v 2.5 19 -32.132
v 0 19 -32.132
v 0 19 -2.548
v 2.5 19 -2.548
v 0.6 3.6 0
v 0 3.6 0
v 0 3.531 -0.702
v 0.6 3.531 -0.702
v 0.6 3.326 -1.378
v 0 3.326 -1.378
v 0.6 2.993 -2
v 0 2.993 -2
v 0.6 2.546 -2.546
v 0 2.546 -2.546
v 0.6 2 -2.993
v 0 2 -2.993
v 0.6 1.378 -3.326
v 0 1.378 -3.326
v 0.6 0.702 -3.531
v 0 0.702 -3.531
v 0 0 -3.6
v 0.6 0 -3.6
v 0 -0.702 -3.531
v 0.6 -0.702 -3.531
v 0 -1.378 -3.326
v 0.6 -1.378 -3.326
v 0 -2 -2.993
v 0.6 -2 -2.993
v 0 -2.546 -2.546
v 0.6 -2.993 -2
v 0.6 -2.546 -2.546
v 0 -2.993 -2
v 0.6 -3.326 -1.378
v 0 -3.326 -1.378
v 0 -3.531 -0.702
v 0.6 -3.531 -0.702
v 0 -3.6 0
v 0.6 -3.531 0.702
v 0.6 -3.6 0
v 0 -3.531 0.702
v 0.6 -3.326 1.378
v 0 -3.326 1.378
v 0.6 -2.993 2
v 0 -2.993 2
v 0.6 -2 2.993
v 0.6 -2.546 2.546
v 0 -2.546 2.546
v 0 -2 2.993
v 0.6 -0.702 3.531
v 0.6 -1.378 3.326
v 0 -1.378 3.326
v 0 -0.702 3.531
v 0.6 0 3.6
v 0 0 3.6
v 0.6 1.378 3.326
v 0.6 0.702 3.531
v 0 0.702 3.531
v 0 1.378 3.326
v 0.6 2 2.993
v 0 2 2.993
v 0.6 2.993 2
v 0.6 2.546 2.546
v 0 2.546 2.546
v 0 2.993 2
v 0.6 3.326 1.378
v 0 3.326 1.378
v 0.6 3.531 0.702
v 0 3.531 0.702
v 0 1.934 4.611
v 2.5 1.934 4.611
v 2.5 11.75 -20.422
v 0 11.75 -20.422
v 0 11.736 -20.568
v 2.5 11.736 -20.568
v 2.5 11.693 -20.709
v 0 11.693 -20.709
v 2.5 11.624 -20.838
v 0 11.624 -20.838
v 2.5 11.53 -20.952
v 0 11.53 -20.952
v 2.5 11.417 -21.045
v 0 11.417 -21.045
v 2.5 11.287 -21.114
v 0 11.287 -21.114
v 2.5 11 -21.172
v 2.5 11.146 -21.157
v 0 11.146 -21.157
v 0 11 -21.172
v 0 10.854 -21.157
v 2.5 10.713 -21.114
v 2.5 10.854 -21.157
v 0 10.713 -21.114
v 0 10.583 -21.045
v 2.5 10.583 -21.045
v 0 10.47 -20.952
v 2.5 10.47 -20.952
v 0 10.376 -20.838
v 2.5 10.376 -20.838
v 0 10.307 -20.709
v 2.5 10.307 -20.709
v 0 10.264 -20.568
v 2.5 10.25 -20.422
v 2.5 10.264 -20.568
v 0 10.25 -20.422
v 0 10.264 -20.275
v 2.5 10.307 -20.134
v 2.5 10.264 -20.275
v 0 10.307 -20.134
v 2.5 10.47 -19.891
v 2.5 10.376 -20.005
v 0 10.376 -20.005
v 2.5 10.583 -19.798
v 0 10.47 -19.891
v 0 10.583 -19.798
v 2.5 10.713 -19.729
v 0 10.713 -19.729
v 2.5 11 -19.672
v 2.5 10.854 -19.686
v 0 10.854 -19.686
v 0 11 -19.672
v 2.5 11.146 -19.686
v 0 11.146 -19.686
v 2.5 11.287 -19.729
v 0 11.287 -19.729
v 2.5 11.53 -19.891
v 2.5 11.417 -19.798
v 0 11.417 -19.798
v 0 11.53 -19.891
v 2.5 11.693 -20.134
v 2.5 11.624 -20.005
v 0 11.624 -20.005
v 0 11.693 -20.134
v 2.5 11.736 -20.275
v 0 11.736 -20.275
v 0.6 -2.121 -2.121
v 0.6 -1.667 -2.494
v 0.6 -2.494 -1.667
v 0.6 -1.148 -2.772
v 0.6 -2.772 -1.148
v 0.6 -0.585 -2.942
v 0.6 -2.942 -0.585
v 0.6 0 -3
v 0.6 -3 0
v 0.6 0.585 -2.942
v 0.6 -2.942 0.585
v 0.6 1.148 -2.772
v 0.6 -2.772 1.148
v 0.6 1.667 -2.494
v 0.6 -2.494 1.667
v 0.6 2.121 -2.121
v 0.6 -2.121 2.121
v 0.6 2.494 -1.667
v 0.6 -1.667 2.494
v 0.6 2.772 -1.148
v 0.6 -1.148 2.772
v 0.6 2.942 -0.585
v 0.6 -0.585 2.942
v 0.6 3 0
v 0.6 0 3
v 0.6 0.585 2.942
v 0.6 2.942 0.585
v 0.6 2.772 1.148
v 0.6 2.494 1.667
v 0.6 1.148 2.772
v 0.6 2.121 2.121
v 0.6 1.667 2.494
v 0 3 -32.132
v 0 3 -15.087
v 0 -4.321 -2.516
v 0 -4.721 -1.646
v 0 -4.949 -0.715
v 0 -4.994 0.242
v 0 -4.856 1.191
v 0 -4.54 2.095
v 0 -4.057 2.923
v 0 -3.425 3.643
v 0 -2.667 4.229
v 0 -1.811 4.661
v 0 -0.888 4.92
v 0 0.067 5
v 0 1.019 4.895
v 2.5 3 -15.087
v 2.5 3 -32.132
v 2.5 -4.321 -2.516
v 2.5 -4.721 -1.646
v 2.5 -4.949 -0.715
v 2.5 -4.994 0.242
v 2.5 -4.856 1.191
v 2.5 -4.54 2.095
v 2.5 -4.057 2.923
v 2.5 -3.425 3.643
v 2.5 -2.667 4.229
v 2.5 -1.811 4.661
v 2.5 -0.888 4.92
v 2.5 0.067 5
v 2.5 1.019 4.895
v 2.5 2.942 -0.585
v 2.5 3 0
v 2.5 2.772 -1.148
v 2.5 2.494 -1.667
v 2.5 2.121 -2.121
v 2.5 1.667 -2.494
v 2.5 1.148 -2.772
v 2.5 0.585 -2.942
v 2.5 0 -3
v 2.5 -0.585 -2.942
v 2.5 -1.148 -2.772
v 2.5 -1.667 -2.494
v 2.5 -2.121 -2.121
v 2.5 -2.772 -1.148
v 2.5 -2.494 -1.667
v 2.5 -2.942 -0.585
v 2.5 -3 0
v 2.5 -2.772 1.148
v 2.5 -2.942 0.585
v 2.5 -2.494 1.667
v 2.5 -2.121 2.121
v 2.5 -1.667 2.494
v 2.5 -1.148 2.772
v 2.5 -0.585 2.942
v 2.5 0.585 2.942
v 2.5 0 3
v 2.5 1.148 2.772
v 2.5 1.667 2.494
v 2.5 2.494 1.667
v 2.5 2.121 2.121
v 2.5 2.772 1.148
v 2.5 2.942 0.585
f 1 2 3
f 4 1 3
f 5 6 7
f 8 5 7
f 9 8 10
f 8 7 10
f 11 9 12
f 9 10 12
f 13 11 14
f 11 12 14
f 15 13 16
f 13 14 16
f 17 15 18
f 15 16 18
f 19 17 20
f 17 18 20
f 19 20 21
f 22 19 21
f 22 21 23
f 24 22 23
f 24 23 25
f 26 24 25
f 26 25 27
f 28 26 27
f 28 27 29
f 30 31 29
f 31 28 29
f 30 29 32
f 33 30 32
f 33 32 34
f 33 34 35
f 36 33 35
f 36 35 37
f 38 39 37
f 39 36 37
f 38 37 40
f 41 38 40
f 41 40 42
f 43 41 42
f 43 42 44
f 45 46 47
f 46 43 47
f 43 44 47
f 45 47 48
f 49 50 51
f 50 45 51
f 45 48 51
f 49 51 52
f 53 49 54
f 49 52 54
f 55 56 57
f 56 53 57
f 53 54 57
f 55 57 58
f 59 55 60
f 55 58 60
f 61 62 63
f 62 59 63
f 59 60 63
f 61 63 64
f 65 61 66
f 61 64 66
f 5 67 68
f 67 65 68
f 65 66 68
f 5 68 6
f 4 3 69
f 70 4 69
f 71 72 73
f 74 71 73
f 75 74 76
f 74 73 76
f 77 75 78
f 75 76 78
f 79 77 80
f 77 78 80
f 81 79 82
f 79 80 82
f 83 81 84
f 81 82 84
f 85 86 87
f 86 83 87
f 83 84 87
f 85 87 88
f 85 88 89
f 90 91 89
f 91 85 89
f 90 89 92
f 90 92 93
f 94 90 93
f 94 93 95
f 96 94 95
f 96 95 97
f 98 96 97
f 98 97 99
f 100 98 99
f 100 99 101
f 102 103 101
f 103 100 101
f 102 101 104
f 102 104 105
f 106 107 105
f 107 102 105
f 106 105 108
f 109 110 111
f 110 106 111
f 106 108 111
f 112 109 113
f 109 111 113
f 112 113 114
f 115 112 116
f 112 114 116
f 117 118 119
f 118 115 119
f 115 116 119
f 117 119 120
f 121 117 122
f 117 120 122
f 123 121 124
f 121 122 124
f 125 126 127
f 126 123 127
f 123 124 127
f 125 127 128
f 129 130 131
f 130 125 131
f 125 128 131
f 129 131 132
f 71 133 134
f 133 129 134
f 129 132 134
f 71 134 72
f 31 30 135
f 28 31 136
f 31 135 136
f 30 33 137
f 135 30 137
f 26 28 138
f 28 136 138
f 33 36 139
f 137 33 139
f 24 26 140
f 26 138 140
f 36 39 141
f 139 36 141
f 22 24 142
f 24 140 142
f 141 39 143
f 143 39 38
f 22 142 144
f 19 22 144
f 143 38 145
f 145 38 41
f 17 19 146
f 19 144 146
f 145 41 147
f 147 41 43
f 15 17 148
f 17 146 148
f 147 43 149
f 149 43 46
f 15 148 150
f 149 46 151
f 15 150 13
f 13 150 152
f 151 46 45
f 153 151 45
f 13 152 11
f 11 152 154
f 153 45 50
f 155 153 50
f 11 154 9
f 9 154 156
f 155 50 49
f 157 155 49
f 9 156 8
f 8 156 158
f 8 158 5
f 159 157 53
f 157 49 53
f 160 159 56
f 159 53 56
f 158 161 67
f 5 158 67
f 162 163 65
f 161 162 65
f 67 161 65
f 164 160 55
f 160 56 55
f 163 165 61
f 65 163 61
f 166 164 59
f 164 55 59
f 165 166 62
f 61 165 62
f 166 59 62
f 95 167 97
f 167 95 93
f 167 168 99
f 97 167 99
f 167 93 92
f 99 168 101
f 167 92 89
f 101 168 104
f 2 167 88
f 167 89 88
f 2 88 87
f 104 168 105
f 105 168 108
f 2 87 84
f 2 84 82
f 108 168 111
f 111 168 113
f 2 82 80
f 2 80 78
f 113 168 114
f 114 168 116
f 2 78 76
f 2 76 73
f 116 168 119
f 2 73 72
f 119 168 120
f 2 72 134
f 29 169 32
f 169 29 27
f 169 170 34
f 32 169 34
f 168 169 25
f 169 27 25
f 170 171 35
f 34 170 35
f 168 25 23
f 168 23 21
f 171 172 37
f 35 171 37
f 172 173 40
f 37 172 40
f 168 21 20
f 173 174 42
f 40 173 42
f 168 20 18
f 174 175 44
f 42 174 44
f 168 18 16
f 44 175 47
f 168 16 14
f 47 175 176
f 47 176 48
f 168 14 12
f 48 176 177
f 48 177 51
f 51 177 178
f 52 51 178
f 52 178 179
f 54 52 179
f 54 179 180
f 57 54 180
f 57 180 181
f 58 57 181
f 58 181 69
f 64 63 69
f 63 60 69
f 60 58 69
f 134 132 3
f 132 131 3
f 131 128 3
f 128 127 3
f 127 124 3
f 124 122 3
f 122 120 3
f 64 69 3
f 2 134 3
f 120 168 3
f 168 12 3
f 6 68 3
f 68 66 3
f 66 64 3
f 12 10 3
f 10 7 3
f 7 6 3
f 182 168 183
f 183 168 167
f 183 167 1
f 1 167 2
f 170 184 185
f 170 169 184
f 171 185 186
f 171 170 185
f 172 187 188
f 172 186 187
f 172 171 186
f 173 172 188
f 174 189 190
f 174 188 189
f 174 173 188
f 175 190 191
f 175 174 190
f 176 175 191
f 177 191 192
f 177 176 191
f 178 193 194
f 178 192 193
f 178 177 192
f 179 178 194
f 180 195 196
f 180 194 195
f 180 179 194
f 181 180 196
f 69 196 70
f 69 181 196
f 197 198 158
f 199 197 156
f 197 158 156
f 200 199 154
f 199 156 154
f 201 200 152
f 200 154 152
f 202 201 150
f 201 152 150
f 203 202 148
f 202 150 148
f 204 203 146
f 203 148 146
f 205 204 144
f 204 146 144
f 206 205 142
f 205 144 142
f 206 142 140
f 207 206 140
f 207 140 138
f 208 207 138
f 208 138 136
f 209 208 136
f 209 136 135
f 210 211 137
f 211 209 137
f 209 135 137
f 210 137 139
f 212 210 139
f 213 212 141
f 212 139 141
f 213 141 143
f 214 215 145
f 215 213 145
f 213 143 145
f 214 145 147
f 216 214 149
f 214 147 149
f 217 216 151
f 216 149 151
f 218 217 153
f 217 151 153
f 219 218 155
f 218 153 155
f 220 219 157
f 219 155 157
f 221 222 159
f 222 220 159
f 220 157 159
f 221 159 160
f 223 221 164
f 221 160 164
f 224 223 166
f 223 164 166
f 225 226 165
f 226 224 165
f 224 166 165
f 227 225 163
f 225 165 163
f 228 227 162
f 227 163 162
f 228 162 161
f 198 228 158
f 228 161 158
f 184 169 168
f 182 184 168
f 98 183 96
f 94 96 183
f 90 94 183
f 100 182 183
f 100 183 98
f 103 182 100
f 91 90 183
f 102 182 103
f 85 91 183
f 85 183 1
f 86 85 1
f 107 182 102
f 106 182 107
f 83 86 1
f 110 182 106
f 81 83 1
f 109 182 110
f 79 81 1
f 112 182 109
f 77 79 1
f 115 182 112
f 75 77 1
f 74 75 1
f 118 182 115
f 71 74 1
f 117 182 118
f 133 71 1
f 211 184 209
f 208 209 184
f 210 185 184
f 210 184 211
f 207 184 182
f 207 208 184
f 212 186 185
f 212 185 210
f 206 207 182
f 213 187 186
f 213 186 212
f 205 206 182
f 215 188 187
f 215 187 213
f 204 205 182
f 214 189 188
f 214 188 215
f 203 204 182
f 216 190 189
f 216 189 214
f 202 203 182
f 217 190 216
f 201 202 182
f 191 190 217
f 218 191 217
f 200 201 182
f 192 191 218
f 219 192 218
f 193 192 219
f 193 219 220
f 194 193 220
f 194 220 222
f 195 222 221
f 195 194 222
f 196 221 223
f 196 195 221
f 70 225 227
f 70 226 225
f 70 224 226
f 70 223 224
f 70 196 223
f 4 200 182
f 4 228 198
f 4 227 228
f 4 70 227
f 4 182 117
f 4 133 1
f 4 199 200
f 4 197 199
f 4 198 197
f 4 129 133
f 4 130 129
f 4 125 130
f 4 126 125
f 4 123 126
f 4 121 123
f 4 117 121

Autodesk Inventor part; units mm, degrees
ref_plane "YZ Plane" through (0, 0, 0) normal (1, 0, 0) x (0, 1, 0)
ref_plane "XZ Plane" through (0, 0, 0) normal (0, 1, 0) x (-1, 0, 0)
ref_plane "XY Plane" through (0, 0, 0) normal (0, 0, 1) x (1, 0, 0)
sketch "スケッチ1" plane through (0, 0, 0) normal (1, 0, 0) x (0, 1, 0)
  circle A0 centre (0, 0) radius 5 construction
  circle A1 centre (0, 0) radius 3.6
  arc A2 (1.9342, 4.6107) -> (-4.3208, -2.5162) centre (0, 0) ccw
  line L0 (-4.3208, -2.5162) -> (3, -15.0874)
  line L1 (3, -15.0874) -> (3, -32.1321)
  line L2 (3, -32.1321) -> (19, -32.1321)
  line L3 (19, -32.1321) -> (19, -2.5484)
  line L4 (19, -2.5484) -> (1.9342, 4.6107)
  circle A3 centre (0, 0) radius 3
  circle A4 centre (11, -20.4215) radius 0.75
  circle A5 centre (11, -20.4215) radius 5 construction
  circle A6 centre (16, -20.4215) radius 1 construction
  line L5 (16, -20.4215) -> (6, -20.4215) construction
  circle A7 centre (6, -20.4215) radius 1 construction
  circle A8 centre (11, -20.4215) radius 8 construction
  dimension "d1" = 10
  dimension "d0" = 7.2
  dimension "d4" = 6
  dimension "d7" = 1.5
  dimension "d8" = 10
  dimension "d9" = 2
  dimension "d11" = 16
extrude "押し出し1" add sketch "スケッチ1" along normal blind 2.5 contours A1 | L4 L3 L2 L1 L0 A2
extrude "押し出し2" cut sketch "スケッチ1" along normal blind 0.6 contours A1 | A3
properties part number "Gear_Frame"
